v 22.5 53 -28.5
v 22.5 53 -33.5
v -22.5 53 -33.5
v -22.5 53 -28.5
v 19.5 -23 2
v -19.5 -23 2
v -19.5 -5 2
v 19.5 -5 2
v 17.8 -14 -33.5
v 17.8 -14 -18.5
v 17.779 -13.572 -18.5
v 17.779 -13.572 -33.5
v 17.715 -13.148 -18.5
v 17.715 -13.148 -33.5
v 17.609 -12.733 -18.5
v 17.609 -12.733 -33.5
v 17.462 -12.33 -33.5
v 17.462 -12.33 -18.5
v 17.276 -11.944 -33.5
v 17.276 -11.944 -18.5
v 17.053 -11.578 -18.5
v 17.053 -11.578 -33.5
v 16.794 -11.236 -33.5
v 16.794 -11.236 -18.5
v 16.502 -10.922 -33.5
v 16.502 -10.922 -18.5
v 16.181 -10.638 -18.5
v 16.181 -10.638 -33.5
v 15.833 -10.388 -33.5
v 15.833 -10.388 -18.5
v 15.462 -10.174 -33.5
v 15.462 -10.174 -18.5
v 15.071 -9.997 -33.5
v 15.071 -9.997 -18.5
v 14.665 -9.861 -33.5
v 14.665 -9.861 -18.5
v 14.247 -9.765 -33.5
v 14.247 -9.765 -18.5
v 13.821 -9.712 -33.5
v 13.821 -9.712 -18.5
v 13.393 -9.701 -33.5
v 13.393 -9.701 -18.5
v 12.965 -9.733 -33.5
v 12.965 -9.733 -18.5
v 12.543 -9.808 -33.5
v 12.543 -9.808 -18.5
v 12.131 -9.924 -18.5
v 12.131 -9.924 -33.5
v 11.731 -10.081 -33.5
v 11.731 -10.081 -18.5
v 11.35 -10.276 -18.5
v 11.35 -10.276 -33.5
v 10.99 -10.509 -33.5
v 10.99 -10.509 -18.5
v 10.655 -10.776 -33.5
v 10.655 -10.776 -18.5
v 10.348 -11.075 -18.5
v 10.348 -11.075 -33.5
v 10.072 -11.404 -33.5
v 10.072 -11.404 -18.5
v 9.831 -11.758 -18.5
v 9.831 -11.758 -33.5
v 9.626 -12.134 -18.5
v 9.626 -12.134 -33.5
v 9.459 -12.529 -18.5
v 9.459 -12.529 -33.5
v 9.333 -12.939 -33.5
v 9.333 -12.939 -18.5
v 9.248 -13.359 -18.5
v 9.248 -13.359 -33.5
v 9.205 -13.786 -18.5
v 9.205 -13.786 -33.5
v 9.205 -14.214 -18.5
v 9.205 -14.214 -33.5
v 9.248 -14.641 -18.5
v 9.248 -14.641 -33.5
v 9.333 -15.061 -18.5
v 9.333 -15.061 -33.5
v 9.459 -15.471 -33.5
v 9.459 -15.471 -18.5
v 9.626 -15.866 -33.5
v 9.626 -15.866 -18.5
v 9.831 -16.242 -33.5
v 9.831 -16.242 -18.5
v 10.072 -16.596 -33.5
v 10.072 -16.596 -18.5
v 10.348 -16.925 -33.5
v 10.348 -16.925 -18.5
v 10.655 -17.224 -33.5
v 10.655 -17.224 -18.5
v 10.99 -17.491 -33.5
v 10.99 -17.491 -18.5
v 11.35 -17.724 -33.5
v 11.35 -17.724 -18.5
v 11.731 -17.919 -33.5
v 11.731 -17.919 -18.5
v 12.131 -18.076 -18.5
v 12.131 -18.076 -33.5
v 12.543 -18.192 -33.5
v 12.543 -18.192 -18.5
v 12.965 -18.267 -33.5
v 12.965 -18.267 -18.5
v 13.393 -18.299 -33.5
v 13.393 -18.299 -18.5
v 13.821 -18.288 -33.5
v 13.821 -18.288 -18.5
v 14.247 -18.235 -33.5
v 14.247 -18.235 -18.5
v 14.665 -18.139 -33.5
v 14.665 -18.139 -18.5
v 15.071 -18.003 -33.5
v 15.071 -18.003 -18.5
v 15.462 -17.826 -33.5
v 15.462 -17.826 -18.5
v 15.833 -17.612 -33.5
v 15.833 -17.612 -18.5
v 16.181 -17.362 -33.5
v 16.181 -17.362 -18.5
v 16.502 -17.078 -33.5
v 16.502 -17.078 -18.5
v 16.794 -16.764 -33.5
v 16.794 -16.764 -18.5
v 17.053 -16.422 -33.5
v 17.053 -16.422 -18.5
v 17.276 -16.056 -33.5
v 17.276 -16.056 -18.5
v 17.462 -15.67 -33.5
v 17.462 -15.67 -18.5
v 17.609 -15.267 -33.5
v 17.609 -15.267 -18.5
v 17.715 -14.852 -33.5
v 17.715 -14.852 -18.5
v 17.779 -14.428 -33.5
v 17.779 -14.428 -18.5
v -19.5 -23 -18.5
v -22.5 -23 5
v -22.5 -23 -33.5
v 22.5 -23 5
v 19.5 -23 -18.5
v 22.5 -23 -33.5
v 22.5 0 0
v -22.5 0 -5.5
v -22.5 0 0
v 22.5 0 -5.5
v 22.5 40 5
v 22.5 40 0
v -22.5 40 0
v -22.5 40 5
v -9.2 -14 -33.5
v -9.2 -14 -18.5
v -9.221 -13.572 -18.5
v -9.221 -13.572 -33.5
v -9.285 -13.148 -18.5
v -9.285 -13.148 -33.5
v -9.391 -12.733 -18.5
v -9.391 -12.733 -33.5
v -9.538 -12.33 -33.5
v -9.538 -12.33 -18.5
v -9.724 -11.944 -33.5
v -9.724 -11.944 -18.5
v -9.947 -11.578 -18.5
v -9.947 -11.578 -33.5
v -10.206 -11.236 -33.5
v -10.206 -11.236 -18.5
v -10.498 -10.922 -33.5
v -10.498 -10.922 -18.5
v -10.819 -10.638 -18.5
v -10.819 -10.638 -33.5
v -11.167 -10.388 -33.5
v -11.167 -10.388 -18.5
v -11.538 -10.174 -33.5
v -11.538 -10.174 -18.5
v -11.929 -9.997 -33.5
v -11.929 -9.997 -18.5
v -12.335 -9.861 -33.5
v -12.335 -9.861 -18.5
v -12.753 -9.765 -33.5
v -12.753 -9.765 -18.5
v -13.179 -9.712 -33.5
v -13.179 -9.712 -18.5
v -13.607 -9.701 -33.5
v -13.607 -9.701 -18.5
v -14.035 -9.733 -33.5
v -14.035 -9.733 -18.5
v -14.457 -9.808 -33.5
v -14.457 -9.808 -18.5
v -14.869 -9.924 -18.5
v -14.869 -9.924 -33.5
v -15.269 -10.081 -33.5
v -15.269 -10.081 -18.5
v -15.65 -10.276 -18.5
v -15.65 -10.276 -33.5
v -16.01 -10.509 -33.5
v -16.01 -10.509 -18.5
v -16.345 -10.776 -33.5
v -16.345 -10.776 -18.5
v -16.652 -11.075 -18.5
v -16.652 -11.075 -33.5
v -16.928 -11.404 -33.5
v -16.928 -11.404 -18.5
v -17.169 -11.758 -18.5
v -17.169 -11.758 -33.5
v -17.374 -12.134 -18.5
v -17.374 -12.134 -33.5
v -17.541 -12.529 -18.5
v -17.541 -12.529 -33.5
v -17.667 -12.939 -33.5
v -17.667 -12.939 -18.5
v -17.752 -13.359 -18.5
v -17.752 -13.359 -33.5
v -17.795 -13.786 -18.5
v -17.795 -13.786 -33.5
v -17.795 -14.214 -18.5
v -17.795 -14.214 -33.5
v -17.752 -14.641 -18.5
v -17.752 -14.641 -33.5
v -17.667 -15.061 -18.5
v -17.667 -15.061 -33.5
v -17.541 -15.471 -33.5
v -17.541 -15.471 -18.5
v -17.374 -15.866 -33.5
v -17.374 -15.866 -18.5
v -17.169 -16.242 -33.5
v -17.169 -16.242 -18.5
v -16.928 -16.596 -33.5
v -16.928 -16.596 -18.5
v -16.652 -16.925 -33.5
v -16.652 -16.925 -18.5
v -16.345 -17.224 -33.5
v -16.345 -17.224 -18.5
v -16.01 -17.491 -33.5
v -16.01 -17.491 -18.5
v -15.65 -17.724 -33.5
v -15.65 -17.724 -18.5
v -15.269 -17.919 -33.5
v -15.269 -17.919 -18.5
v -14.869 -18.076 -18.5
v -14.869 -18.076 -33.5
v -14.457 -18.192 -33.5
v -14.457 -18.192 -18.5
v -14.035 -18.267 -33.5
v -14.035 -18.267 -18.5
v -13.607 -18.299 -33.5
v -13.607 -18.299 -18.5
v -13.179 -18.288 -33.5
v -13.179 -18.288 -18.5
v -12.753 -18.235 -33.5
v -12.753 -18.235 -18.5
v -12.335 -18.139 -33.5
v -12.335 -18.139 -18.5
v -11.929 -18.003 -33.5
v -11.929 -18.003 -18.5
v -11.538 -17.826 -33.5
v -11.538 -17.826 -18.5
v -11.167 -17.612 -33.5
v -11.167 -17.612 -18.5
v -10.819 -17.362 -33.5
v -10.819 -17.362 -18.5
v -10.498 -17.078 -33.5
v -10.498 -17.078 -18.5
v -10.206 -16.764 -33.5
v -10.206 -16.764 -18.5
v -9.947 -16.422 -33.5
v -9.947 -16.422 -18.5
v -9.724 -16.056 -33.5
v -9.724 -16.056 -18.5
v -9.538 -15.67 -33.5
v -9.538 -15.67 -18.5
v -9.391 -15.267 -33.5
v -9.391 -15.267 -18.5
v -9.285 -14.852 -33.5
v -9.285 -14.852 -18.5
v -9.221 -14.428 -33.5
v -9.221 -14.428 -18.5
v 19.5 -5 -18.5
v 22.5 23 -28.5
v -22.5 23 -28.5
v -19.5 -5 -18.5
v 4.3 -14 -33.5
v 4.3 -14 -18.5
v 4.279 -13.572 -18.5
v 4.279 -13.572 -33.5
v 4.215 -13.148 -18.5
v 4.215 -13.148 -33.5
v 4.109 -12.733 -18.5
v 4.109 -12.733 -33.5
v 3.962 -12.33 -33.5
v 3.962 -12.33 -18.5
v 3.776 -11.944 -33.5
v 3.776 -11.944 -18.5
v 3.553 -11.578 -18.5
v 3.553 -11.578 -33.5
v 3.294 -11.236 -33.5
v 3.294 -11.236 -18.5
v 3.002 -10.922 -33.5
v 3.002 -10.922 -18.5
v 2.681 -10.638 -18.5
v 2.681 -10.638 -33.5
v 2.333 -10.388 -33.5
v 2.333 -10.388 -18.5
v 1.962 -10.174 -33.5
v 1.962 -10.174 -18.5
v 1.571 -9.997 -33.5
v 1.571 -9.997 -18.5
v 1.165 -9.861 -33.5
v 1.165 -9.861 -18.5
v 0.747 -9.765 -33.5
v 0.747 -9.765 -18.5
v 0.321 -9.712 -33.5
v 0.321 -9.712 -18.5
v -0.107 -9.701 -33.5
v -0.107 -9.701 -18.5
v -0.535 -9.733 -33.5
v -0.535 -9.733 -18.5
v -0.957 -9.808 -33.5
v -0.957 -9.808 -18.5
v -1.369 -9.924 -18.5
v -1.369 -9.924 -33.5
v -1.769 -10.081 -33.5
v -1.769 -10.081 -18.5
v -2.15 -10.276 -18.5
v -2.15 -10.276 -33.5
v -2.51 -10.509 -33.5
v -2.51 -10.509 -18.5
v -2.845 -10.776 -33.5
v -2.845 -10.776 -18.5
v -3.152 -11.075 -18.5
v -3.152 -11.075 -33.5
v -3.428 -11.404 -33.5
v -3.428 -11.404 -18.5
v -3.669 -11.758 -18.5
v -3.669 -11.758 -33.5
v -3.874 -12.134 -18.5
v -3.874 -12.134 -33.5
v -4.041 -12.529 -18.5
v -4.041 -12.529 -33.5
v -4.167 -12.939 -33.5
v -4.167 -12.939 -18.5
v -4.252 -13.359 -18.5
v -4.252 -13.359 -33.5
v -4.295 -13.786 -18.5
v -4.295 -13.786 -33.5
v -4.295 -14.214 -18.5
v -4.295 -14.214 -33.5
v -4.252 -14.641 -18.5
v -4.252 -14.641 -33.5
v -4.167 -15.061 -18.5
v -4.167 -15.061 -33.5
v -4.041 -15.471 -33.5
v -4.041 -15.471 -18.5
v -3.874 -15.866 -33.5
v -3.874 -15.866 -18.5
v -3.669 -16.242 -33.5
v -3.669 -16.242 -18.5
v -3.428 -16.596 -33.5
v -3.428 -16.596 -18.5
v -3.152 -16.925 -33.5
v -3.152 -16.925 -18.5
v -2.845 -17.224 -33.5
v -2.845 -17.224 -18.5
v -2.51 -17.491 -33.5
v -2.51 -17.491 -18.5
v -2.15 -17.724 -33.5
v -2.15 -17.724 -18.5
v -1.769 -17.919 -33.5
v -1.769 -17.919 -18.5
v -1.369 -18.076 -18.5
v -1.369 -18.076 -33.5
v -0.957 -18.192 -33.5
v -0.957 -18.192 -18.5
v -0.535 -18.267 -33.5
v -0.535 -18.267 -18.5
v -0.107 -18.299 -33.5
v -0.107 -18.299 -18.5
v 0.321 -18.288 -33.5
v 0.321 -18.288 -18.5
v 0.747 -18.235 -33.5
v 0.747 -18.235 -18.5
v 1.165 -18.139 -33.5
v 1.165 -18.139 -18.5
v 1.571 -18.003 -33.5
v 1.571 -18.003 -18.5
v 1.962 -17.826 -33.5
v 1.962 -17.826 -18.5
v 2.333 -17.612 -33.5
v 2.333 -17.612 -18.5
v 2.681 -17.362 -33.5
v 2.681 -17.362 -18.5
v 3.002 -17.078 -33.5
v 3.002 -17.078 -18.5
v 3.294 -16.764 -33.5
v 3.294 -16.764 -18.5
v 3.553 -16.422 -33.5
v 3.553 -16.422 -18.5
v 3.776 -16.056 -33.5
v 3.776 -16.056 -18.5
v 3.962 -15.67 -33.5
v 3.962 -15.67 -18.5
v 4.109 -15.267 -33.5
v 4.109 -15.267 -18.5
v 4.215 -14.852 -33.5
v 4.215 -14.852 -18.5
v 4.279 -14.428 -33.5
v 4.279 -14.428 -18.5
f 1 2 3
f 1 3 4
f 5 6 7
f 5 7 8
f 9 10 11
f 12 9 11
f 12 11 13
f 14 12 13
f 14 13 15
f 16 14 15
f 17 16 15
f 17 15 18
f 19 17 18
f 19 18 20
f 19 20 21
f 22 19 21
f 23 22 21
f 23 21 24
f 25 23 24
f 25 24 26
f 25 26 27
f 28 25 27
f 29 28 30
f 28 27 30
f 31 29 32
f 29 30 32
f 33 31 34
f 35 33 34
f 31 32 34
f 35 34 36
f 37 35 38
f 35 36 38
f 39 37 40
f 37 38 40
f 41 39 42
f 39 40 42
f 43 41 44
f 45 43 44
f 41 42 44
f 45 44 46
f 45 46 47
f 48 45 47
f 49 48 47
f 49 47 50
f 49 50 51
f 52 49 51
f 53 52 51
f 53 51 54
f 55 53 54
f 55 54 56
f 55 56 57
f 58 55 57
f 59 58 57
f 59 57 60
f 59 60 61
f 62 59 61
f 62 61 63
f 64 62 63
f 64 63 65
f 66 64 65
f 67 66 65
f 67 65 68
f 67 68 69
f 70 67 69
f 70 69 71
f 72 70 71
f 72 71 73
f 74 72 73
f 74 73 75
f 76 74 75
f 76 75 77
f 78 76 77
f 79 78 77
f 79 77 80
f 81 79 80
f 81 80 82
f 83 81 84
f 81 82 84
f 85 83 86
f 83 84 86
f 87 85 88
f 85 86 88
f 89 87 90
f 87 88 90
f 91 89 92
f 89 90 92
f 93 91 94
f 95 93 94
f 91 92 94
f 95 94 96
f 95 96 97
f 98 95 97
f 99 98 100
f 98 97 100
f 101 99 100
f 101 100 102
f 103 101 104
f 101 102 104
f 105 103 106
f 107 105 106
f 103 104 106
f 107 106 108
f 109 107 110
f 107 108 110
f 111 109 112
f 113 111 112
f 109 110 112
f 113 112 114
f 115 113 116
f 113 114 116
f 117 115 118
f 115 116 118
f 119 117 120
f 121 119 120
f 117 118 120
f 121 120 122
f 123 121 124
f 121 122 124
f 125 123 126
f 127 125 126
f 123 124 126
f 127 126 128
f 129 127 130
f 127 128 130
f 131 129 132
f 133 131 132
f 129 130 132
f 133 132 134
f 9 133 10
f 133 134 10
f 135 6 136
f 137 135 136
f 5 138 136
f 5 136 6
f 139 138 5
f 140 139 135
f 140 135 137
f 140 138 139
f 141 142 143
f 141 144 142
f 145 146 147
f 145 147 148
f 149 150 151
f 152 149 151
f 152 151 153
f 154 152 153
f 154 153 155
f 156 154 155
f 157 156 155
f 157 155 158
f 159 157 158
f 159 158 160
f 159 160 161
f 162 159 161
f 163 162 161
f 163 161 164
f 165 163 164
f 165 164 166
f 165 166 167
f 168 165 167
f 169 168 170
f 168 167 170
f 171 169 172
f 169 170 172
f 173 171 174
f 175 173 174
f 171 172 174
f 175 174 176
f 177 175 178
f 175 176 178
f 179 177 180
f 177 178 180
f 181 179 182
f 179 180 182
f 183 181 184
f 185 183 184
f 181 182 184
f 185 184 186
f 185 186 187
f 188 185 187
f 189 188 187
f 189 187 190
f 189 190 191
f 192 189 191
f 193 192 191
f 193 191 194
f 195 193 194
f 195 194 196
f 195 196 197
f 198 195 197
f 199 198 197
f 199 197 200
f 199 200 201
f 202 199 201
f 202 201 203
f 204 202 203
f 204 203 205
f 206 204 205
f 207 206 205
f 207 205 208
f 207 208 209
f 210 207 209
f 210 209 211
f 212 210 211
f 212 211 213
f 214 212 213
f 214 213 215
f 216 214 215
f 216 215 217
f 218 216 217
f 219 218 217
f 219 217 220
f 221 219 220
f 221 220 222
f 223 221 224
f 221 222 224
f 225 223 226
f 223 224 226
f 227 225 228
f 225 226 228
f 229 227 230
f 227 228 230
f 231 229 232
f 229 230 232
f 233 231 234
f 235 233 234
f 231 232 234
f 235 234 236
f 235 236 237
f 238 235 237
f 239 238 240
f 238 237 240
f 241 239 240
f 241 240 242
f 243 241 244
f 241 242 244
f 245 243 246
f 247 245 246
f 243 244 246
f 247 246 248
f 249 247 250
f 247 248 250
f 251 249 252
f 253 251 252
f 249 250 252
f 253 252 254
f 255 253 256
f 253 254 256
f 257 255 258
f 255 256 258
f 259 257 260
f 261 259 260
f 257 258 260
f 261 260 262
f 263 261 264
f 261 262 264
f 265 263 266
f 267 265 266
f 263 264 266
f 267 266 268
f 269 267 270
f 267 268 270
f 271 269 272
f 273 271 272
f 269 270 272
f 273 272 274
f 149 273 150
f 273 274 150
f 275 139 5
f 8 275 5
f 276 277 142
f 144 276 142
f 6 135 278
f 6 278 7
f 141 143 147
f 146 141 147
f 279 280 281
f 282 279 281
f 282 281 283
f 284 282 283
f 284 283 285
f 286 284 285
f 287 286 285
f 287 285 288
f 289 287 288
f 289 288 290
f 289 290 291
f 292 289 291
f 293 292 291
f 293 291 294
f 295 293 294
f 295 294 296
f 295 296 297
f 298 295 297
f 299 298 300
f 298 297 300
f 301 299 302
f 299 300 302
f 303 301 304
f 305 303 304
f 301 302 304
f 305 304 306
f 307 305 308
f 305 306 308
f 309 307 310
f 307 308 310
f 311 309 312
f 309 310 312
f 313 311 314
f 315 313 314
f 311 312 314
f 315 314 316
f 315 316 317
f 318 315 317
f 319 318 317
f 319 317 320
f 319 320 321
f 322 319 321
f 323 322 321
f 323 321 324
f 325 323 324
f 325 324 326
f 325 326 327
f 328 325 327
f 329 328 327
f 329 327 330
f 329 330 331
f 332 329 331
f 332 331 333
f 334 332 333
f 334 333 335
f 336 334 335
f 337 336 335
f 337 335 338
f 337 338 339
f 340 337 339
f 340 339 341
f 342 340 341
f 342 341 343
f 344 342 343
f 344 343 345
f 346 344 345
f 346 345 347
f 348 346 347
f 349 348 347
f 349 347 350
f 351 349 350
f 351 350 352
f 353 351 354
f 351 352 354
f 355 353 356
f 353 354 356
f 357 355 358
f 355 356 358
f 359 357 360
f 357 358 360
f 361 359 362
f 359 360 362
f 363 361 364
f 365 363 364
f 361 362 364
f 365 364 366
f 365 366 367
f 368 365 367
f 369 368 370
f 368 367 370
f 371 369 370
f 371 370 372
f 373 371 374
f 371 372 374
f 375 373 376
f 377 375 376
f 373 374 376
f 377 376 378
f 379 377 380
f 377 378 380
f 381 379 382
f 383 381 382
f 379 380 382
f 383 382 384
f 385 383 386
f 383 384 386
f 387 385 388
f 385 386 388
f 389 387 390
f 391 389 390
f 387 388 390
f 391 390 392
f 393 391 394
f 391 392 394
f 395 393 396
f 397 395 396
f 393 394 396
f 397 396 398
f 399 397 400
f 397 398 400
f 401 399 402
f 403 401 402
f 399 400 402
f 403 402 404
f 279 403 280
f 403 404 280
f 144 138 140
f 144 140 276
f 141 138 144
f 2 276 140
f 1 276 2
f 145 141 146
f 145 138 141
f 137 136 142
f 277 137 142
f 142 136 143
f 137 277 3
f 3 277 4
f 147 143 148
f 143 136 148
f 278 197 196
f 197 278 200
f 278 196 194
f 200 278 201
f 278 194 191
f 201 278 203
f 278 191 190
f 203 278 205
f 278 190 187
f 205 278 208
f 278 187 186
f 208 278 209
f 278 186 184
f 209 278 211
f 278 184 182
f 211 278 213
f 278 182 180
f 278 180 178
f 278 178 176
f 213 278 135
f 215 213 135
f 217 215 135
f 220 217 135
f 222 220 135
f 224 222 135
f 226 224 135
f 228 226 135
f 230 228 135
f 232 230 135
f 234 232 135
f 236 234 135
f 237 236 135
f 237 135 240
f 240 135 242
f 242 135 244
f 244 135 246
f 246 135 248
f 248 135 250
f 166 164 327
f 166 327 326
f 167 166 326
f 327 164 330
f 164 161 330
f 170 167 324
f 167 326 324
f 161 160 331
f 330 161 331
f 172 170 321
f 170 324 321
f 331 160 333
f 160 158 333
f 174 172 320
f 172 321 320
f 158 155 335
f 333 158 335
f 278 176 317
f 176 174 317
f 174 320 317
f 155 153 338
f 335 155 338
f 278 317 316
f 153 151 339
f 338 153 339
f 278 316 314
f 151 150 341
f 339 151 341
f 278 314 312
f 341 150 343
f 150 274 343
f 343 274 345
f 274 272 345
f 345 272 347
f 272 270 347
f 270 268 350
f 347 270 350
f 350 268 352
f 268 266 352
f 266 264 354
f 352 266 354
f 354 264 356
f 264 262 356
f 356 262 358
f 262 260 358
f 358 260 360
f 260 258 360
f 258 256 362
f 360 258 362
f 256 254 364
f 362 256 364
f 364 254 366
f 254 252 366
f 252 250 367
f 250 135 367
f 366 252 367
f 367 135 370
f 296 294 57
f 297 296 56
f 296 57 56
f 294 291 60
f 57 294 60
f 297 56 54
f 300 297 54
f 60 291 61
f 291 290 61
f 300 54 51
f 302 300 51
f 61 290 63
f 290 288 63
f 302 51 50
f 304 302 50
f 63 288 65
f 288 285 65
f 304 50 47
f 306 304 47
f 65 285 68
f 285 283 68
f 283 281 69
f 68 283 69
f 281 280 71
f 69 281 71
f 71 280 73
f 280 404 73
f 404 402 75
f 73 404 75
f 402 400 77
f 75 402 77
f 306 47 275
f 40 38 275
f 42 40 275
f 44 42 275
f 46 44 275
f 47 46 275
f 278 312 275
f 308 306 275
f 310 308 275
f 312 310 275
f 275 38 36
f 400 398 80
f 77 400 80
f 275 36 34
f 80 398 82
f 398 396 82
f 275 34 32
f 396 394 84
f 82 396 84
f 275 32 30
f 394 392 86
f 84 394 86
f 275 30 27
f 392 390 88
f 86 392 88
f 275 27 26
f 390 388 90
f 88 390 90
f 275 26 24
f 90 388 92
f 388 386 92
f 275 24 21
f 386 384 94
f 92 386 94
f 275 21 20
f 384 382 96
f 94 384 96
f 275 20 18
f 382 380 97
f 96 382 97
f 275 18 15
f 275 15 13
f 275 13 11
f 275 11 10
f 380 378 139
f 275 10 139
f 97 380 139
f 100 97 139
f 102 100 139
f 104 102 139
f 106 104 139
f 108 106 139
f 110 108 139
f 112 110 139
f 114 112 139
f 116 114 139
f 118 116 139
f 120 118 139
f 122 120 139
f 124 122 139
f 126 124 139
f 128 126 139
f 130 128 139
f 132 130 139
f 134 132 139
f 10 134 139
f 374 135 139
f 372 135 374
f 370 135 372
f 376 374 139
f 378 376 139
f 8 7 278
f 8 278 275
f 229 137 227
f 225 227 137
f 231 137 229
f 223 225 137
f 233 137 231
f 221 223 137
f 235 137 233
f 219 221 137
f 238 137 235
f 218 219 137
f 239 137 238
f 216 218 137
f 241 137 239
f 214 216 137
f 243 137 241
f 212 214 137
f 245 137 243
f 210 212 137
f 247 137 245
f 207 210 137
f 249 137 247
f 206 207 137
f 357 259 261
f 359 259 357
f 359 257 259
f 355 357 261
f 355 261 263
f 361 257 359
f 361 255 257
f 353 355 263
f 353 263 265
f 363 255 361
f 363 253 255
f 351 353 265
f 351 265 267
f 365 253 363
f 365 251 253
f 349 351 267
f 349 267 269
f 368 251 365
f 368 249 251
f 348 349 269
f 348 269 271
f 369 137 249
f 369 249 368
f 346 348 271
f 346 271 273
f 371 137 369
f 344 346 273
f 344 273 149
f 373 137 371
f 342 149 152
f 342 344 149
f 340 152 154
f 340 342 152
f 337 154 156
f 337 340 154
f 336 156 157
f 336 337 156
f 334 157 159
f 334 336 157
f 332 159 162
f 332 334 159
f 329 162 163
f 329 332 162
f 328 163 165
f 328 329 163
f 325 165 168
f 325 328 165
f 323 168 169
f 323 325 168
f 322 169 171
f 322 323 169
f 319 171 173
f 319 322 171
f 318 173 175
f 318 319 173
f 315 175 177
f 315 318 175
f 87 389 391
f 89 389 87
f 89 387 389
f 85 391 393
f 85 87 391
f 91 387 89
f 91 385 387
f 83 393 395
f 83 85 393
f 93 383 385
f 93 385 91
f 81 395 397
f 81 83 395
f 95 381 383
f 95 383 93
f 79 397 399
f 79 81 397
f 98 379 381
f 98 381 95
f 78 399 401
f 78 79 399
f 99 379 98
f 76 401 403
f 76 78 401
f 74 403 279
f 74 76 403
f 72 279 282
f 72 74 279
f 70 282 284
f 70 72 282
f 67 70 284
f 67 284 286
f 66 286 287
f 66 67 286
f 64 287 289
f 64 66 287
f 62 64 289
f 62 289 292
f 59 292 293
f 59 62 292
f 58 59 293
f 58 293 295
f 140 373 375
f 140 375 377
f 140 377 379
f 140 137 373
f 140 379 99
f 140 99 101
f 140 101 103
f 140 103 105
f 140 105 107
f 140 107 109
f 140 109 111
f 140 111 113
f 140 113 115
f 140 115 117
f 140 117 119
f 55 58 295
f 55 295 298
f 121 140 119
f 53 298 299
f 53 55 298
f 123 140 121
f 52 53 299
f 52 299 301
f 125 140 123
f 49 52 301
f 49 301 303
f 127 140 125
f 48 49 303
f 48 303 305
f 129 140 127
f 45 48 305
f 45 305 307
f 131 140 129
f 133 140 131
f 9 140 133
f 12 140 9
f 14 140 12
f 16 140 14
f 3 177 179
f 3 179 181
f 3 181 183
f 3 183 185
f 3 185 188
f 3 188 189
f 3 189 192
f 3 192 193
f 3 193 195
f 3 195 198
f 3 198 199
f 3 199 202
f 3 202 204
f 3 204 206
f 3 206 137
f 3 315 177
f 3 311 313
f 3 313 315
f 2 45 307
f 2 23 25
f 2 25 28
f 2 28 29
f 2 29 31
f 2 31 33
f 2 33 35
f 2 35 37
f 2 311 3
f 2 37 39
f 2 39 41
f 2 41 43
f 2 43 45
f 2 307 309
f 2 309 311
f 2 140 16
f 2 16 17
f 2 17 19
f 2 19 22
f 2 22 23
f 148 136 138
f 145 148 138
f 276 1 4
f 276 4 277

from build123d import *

# Parameters (mm, degrees)
F1_DEPTH  = 22.5
F3_DEPTH  = 45
F4_R      = 4.3
F5_DEPTH  = 38.501
F6_W      = 39
F6_H      = 20.5
F7_DEPTH  = 18
F8_DEPTH  = 18
F9_R      = 4.3
F10_DEPTH = 3


with BuildPart() as f1:
    # F0 (on Right) → F1 (new body, symmetric)
    with BuildSketch(Plane.YZ):
        Polygon((0, 0), (40, 0), (40, 5), (-5, 5), (-5, -7.571068), (20.928932, -33.5), (53, -33.5), (53, -28.5), (23, -28.5), (0, -5.5), align=None)
    extrude(amount=F1_DEPTH, both=True)

    # F2 (on face) → F3 (join, through all)
    with BuildSketch(Plane.YZ.offset(22.5)):
        Polygon((-5, -7.571068), (-5, 5), (-23, 5), (-23, -33.5), (20.928932, -33.5), align=None)
    extrude(amount=-F3_DEPTH)

    # F4 (on face) → F5 (cut, through all)
    with BuildSketch(Plane.XY.offset(5)):
        with Locations((0, -14)):
            Circle(F4_R)
        with Locations((13.5, -14)):
            Circle(F4_R)
        with Locations((-13.5, -14)):
            Circle(F4_R)
    extrude(amount=-F5_DEPTH, mode=Mode.SUBTRACT)

    # F6 (on face) → F7 (cut)
    with BuildSketch(Plane.XZ.offset(23)):
        with Locations((0, -8.25)):
            Rectangle(F6_W, F6_H)
    extrude(amount=-F7_DEPTH, mode=Mode.SUBTRACT)

    # F6 (on face) → F8 (cut)
    with BuildSketch(Plane.XZ.offset(23)):
        with Locations((0, -8.25)):
            Rectangle(F6_W, F6_H)
    extrude(amount=-F8_DEPTH, mode=Mode.SUBTRACT)

    # F9 (on face) → F10 (join, through all)
    with BuildSketch(Plane.XY.offset(5)):
        with Locations((-13.5, -14)):
            Circle(F9_R)
        with Locations((0, -14)):
            Circle(F9_R)
        with Locations((13.5, -14)):
            Circle(F9_R)
    extrude(amount=-F10_DEPTH)


solid = f1.part
